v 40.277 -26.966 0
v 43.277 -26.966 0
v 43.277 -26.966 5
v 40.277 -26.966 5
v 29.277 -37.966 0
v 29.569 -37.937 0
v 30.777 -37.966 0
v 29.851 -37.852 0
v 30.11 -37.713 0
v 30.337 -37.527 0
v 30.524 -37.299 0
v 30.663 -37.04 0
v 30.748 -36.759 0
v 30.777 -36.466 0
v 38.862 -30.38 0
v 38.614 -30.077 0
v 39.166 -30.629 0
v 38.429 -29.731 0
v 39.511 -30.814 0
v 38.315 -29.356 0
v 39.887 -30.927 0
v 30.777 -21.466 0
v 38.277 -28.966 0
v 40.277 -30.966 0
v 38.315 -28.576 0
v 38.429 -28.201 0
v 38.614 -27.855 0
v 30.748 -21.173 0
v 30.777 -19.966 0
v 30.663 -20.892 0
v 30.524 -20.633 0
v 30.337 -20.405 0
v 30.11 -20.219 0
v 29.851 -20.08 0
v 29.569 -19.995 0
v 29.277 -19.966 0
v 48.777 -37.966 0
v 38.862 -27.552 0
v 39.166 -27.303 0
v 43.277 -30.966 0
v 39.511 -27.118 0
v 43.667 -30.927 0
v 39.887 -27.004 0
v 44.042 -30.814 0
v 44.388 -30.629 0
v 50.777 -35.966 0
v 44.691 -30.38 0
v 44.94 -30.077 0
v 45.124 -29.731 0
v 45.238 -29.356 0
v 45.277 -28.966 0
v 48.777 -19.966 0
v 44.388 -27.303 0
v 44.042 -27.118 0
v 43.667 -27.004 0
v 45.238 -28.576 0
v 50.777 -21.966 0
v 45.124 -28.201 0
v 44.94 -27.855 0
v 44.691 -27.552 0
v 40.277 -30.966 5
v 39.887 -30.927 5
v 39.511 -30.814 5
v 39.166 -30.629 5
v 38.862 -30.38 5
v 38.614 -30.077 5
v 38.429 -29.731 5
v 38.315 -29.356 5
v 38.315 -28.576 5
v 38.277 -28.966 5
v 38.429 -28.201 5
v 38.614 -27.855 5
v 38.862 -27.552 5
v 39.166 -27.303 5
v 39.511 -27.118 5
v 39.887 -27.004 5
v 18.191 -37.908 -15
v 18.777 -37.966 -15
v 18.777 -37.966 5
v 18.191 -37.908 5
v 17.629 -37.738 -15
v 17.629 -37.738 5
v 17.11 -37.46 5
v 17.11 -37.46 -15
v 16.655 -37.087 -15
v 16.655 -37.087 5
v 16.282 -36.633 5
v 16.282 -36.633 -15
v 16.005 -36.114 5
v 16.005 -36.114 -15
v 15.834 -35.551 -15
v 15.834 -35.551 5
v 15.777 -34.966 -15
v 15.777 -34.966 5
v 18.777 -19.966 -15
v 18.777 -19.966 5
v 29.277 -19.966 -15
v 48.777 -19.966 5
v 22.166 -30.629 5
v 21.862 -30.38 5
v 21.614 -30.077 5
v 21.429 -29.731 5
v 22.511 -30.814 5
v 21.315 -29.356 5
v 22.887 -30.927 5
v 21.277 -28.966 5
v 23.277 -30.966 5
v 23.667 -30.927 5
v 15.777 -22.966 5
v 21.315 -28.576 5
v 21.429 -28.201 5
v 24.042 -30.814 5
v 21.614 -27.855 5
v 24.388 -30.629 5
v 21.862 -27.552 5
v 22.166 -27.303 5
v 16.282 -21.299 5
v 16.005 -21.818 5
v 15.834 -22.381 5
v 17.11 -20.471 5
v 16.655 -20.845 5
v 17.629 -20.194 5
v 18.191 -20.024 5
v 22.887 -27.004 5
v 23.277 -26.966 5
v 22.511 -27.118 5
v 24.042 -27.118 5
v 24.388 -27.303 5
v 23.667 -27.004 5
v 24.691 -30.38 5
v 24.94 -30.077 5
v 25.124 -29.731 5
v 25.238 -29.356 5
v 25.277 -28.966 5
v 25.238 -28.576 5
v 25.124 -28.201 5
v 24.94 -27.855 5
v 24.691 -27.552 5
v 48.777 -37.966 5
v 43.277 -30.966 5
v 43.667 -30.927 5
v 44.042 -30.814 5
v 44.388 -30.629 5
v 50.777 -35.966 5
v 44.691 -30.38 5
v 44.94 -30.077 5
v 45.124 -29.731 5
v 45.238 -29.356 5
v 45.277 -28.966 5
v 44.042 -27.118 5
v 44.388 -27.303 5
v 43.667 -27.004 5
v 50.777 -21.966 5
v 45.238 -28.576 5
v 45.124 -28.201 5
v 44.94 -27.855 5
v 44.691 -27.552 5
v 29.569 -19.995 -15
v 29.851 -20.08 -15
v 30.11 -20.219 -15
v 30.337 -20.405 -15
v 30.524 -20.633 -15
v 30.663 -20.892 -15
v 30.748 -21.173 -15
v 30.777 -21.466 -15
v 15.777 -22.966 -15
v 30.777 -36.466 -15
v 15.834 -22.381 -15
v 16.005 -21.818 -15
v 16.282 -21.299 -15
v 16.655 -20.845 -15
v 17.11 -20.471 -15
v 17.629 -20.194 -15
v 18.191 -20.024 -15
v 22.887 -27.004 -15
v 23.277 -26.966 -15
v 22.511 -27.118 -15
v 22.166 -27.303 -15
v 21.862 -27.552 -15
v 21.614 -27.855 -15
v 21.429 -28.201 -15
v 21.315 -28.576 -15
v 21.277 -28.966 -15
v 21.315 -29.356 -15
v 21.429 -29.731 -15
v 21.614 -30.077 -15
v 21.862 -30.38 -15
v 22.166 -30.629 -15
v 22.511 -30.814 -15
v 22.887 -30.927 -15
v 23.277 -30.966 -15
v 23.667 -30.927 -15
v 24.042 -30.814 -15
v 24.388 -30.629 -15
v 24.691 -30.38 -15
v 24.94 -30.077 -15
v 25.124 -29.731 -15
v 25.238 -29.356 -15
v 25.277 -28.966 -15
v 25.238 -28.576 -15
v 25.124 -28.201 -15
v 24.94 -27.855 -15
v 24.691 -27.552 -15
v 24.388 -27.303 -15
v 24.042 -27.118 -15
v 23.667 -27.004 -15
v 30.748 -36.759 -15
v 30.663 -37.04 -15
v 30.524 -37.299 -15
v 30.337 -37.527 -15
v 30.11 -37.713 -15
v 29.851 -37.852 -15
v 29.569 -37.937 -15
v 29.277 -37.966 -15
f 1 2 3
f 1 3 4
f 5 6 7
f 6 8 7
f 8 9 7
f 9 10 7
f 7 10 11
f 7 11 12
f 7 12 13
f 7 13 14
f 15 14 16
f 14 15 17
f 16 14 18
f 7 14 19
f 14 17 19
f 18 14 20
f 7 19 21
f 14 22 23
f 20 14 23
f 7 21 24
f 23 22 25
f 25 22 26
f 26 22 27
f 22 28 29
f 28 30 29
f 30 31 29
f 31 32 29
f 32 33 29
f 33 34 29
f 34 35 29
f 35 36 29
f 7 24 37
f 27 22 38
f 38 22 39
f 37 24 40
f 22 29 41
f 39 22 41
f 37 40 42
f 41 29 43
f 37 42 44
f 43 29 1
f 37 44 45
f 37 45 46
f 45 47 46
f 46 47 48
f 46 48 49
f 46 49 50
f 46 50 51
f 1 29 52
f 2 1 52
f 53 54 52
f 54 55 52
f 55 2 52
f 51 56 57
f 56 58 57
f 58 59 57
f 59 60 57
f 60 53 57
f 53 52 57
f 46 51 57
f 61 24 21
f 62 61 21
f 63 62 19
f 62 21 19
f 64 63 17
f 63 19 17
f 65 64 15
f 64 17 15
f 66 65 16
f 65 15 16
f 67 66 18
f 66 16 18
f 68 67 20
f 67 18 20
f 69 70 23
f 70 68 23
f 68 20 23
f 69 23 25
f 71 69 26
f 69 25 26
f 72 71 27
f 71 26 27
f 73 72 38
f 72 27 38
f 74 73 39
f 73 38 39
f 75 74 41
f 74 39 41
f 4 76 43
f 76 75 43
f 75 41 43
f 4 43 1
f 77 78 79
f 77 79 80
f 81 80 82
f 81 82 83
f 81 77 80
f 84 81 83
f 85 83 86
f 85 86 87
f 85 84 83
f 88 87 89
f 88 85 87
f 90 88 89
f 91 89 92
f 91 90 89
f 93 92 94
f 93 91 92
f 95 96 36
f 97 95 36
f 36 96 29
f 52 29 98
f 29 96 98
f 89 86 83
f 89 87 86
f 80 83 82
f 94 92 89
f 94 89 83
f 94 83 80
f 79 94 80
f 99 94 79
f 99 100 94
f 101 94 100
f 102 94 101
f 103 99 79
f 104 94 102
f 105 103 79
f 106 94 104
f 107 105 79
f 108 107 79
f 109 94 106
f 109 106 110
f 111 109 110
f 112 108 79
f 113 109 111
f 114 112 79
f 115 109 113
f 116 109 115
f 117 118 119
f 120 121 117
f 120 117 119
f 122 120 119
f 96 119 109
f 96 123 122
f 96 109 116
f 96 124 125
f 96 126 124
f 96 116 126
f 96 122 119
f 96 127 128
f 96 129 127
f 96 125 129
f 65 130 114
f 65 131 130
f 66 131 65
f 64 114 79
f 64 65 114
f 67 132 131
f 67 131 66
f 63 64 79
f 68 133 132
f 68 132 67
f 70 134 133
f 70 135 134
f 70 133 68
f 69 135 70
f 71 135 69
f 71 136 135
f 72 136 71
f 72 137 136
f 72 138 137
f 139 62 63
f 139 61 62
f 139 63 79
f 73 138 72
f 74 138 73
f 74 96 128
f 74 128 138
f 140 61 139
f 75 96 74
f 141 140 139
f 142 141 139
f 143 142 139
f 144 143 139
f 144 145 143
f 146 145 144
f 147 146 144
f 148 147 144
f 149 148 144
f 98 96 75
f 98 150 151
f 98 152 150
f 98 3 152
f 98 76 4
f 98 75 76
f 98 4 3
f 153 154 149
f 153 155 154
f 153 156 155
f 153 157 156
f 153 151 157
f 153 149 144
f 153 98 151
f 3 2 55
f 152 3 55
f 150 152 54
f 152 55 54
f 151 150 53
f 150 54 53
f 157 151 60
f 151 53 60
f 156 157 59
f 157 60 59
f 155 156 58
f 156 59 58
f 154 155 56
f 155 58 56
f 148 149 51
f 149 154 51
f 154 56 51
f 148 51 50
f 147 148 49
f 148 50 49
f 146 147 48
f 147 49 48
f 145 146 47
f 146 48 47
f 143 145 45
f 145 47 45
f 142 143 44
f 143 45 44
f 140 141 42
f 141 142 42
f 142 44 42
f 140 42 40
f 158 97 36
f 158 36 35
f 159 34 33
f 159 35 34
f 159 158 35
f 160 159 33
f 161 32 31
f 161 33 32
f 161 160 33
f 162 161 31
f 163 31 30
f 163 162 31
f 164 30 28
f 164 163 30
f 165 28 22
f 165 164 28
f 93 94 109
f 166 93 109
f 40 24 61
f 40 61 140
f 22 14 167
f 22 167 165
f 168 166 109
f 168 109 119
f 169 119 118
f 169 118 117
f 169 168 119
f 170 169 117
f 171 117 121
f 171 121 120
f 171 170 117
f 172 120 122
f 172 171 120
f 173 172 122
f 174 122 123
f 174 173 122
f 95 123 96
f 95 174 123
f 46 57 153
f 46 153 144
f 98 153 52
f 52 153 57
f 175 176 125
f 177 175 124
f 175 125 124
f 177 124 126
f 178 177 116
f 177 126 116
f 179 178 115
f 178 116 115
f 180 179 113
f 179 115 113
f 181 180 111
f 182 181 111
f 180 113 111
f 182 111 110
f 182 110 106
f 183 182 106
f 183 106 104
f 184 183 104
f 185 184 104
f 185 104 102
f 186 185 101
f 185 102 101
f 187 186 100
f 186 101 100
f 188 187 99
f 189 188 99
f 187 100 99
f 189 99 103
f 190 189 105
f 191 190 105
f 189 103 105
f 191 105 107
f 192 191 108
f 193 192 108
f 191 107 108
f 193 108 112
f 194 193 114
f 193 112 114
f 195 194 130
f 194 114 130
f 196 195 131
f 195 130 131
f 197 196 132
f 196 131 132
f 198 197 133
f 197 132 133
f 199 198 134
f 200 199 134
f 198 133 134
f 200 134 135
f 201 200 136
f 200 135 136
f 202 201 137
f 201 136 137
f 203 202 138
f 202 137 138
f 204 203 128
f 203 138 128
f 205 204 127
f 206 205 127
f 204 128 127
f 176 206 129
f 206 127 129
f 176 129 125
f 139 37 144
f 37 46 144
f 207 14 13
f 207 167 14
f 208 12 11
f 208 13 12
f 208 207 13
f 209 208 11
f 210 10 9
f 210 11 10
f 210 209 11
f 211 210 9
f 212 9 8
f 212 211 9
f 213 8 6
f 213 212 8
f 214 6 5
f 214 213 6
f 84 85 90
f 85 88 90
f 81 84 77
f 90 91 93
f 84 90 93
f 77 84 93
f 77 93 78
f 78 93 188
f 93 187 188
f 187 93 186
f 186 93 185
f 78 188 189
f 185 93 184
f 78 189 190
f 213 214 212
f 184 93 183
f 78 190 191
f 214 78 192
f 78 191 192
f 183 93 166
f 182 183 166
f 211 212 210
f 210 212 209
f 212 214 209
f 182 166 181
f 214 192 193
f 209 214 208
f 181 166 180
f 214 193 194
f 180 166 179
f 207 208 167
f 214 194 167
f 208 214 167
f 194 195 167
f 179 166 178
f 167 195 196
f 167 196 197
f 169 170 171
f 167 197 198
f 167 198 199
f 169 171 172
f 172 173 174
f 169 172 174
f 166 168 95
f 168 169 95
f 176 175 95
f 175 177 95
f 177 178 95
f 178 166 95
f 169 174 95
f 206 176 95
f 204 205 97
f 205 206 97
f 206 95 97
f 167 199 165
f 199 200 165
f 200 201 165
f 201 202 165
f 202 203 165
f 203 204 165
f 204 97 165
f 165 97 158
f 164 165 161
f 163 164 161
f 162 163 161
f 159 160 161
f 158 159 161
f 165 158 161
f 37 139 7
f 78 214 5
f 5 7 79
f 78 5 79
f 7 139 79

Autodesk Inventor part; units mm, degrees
ref_plane "YZ Plane" through (0, 0, 0) normal (1, 0, 0) x (0, 1, 0)
ref_plane "XZ Plane" through (0, 0, 0) normal (0, 1, 0) x (-1, 0, 0)
ref_plane "XY Plane" through (0, 0, 0) normal (0, 0, 1) x (1, 0, 0)
sketch "Szkic1" plane through (0, 0, 0) normal (0, 0, 1) x (1, 0, 0)
  line L0 (14.7767, -38.9659) -> (51.7767, -38.9659)
  line L1 (51.7767, -38.9659) -> (51.7767, -18.9659)
  line L2 (51.7767, -18.9659) -> (14.7767, -18.9659)
  line L3 (43.2767, -28.9659) -> (40.2767, -28.9659) construction
  line L4 (43.2767, -26.9659) -> (40.2767, -26.9659)
  line L5 (40.2767, -30.9659) -> (43.2767, -30.9659)
  arc A0 (43.2767, -30.9659) -> (43.2767, -26.9659) centre (43.2767, -28.9659) ccw
  arc A1 (40.2767, -26.9659) -> (40.2767, -30.9659) centre (40.2767, -28.9659) ccw
  line L6 (14.7767, -38.9659) -> (14.7767, -18.9659)
  line L7 (50.7767, -37.9659) -> (15.7767, -37.9659)
  line L8 (15.7767, -37.9659) -> (15.7767, -19.9659)
  line L9 (15.7767, -19.9659) -> (50.7767, -19.9659)
  line L10 (50.7767, -19.9659) -> (50.7767, -37.9659)
  line L11 (30.7767, -37.9659) -> (30.7767, -19.9659)
  point P0 (0, 0)
  point P1 (41.7767, -28.9659)
  dimension "d0" = 20
  dimension "d1" = 37
  dimension "d2" = 10
  dimension "d3" = 10
  dimension "d4" = 1.5
  dimension "d5" = 4
  dimension "d6" = 37
  dimension "d7" = 1
  dimension "d8" = 20
extrude "Wyciągnięcie proste1" add sketch "Szkic1" along normal blind 5 contours L7 L11 L9 L10 | L7 L8 L9 L11
extrude "Wyciągnięcie proste2" add sketch "Szkic1" against normal blind 15 contours L7 L8 L9 L11
chamfer "Faza1" distance 2 angle 45 2 edges at (50.7767, -19.9659, 2.5) (50.7767, -37.9659, 2.5)
fillet "Zaokrąglenie1" radius 3 2 edges at (15.7767, -37.9659, -5) (15.7767, -19.9659, -5)
sketch "Szkic2" plane through (0, 0, -15) normal (0, 0, -1) x (-1, 0, 0)
  arc A0 (-15.7767, -22.9659) -> (-18.7767, -19.9659) centre (-18.7767, -22.9659) ccw projected
  line L0 (-18.7767, -19.9659) -> (-30.7767, -19.9659) projected
  line L1 (-30.7767, -19.9659) -> (-30.7767, -37.9659) projected
  line L2 (-30.7767, -37.9659) -> (-18.7767, -37.9659) projected
  arc A1 (-18.7767, -37.9659) -> (-15.7767, -34.9659) centre (-18.7767, -34.9659) ccw projected
  line L3 (-15.7767, -34.9659) -> (-15.7767, -22.9659) projected
  point P0 (0, 0)
  point P1 (-23.2767, -28.9659)
  dimension "d17" = 18
  dimension "d18" = 15
  dimension "d19" = 7.5
  dimension "d20" = 9
hole "Otwór1" at (23.2767, -28.9659, -15) direction (0, 0, 1) diameter 4 end through all
fillet "Zaokrąglenie2" radius 1.5 2 edges at (30.7767, -37.9659, -7.5) (30.7767, -19.9659, -7.5)
equation "\"d6\" = d1"
equation "\"d19\" = 0.5 * d18"
equation "\"d20\" = 0.5 * d17"
properties part number "3DP_ABS_X_End_Bearing_Mount"
